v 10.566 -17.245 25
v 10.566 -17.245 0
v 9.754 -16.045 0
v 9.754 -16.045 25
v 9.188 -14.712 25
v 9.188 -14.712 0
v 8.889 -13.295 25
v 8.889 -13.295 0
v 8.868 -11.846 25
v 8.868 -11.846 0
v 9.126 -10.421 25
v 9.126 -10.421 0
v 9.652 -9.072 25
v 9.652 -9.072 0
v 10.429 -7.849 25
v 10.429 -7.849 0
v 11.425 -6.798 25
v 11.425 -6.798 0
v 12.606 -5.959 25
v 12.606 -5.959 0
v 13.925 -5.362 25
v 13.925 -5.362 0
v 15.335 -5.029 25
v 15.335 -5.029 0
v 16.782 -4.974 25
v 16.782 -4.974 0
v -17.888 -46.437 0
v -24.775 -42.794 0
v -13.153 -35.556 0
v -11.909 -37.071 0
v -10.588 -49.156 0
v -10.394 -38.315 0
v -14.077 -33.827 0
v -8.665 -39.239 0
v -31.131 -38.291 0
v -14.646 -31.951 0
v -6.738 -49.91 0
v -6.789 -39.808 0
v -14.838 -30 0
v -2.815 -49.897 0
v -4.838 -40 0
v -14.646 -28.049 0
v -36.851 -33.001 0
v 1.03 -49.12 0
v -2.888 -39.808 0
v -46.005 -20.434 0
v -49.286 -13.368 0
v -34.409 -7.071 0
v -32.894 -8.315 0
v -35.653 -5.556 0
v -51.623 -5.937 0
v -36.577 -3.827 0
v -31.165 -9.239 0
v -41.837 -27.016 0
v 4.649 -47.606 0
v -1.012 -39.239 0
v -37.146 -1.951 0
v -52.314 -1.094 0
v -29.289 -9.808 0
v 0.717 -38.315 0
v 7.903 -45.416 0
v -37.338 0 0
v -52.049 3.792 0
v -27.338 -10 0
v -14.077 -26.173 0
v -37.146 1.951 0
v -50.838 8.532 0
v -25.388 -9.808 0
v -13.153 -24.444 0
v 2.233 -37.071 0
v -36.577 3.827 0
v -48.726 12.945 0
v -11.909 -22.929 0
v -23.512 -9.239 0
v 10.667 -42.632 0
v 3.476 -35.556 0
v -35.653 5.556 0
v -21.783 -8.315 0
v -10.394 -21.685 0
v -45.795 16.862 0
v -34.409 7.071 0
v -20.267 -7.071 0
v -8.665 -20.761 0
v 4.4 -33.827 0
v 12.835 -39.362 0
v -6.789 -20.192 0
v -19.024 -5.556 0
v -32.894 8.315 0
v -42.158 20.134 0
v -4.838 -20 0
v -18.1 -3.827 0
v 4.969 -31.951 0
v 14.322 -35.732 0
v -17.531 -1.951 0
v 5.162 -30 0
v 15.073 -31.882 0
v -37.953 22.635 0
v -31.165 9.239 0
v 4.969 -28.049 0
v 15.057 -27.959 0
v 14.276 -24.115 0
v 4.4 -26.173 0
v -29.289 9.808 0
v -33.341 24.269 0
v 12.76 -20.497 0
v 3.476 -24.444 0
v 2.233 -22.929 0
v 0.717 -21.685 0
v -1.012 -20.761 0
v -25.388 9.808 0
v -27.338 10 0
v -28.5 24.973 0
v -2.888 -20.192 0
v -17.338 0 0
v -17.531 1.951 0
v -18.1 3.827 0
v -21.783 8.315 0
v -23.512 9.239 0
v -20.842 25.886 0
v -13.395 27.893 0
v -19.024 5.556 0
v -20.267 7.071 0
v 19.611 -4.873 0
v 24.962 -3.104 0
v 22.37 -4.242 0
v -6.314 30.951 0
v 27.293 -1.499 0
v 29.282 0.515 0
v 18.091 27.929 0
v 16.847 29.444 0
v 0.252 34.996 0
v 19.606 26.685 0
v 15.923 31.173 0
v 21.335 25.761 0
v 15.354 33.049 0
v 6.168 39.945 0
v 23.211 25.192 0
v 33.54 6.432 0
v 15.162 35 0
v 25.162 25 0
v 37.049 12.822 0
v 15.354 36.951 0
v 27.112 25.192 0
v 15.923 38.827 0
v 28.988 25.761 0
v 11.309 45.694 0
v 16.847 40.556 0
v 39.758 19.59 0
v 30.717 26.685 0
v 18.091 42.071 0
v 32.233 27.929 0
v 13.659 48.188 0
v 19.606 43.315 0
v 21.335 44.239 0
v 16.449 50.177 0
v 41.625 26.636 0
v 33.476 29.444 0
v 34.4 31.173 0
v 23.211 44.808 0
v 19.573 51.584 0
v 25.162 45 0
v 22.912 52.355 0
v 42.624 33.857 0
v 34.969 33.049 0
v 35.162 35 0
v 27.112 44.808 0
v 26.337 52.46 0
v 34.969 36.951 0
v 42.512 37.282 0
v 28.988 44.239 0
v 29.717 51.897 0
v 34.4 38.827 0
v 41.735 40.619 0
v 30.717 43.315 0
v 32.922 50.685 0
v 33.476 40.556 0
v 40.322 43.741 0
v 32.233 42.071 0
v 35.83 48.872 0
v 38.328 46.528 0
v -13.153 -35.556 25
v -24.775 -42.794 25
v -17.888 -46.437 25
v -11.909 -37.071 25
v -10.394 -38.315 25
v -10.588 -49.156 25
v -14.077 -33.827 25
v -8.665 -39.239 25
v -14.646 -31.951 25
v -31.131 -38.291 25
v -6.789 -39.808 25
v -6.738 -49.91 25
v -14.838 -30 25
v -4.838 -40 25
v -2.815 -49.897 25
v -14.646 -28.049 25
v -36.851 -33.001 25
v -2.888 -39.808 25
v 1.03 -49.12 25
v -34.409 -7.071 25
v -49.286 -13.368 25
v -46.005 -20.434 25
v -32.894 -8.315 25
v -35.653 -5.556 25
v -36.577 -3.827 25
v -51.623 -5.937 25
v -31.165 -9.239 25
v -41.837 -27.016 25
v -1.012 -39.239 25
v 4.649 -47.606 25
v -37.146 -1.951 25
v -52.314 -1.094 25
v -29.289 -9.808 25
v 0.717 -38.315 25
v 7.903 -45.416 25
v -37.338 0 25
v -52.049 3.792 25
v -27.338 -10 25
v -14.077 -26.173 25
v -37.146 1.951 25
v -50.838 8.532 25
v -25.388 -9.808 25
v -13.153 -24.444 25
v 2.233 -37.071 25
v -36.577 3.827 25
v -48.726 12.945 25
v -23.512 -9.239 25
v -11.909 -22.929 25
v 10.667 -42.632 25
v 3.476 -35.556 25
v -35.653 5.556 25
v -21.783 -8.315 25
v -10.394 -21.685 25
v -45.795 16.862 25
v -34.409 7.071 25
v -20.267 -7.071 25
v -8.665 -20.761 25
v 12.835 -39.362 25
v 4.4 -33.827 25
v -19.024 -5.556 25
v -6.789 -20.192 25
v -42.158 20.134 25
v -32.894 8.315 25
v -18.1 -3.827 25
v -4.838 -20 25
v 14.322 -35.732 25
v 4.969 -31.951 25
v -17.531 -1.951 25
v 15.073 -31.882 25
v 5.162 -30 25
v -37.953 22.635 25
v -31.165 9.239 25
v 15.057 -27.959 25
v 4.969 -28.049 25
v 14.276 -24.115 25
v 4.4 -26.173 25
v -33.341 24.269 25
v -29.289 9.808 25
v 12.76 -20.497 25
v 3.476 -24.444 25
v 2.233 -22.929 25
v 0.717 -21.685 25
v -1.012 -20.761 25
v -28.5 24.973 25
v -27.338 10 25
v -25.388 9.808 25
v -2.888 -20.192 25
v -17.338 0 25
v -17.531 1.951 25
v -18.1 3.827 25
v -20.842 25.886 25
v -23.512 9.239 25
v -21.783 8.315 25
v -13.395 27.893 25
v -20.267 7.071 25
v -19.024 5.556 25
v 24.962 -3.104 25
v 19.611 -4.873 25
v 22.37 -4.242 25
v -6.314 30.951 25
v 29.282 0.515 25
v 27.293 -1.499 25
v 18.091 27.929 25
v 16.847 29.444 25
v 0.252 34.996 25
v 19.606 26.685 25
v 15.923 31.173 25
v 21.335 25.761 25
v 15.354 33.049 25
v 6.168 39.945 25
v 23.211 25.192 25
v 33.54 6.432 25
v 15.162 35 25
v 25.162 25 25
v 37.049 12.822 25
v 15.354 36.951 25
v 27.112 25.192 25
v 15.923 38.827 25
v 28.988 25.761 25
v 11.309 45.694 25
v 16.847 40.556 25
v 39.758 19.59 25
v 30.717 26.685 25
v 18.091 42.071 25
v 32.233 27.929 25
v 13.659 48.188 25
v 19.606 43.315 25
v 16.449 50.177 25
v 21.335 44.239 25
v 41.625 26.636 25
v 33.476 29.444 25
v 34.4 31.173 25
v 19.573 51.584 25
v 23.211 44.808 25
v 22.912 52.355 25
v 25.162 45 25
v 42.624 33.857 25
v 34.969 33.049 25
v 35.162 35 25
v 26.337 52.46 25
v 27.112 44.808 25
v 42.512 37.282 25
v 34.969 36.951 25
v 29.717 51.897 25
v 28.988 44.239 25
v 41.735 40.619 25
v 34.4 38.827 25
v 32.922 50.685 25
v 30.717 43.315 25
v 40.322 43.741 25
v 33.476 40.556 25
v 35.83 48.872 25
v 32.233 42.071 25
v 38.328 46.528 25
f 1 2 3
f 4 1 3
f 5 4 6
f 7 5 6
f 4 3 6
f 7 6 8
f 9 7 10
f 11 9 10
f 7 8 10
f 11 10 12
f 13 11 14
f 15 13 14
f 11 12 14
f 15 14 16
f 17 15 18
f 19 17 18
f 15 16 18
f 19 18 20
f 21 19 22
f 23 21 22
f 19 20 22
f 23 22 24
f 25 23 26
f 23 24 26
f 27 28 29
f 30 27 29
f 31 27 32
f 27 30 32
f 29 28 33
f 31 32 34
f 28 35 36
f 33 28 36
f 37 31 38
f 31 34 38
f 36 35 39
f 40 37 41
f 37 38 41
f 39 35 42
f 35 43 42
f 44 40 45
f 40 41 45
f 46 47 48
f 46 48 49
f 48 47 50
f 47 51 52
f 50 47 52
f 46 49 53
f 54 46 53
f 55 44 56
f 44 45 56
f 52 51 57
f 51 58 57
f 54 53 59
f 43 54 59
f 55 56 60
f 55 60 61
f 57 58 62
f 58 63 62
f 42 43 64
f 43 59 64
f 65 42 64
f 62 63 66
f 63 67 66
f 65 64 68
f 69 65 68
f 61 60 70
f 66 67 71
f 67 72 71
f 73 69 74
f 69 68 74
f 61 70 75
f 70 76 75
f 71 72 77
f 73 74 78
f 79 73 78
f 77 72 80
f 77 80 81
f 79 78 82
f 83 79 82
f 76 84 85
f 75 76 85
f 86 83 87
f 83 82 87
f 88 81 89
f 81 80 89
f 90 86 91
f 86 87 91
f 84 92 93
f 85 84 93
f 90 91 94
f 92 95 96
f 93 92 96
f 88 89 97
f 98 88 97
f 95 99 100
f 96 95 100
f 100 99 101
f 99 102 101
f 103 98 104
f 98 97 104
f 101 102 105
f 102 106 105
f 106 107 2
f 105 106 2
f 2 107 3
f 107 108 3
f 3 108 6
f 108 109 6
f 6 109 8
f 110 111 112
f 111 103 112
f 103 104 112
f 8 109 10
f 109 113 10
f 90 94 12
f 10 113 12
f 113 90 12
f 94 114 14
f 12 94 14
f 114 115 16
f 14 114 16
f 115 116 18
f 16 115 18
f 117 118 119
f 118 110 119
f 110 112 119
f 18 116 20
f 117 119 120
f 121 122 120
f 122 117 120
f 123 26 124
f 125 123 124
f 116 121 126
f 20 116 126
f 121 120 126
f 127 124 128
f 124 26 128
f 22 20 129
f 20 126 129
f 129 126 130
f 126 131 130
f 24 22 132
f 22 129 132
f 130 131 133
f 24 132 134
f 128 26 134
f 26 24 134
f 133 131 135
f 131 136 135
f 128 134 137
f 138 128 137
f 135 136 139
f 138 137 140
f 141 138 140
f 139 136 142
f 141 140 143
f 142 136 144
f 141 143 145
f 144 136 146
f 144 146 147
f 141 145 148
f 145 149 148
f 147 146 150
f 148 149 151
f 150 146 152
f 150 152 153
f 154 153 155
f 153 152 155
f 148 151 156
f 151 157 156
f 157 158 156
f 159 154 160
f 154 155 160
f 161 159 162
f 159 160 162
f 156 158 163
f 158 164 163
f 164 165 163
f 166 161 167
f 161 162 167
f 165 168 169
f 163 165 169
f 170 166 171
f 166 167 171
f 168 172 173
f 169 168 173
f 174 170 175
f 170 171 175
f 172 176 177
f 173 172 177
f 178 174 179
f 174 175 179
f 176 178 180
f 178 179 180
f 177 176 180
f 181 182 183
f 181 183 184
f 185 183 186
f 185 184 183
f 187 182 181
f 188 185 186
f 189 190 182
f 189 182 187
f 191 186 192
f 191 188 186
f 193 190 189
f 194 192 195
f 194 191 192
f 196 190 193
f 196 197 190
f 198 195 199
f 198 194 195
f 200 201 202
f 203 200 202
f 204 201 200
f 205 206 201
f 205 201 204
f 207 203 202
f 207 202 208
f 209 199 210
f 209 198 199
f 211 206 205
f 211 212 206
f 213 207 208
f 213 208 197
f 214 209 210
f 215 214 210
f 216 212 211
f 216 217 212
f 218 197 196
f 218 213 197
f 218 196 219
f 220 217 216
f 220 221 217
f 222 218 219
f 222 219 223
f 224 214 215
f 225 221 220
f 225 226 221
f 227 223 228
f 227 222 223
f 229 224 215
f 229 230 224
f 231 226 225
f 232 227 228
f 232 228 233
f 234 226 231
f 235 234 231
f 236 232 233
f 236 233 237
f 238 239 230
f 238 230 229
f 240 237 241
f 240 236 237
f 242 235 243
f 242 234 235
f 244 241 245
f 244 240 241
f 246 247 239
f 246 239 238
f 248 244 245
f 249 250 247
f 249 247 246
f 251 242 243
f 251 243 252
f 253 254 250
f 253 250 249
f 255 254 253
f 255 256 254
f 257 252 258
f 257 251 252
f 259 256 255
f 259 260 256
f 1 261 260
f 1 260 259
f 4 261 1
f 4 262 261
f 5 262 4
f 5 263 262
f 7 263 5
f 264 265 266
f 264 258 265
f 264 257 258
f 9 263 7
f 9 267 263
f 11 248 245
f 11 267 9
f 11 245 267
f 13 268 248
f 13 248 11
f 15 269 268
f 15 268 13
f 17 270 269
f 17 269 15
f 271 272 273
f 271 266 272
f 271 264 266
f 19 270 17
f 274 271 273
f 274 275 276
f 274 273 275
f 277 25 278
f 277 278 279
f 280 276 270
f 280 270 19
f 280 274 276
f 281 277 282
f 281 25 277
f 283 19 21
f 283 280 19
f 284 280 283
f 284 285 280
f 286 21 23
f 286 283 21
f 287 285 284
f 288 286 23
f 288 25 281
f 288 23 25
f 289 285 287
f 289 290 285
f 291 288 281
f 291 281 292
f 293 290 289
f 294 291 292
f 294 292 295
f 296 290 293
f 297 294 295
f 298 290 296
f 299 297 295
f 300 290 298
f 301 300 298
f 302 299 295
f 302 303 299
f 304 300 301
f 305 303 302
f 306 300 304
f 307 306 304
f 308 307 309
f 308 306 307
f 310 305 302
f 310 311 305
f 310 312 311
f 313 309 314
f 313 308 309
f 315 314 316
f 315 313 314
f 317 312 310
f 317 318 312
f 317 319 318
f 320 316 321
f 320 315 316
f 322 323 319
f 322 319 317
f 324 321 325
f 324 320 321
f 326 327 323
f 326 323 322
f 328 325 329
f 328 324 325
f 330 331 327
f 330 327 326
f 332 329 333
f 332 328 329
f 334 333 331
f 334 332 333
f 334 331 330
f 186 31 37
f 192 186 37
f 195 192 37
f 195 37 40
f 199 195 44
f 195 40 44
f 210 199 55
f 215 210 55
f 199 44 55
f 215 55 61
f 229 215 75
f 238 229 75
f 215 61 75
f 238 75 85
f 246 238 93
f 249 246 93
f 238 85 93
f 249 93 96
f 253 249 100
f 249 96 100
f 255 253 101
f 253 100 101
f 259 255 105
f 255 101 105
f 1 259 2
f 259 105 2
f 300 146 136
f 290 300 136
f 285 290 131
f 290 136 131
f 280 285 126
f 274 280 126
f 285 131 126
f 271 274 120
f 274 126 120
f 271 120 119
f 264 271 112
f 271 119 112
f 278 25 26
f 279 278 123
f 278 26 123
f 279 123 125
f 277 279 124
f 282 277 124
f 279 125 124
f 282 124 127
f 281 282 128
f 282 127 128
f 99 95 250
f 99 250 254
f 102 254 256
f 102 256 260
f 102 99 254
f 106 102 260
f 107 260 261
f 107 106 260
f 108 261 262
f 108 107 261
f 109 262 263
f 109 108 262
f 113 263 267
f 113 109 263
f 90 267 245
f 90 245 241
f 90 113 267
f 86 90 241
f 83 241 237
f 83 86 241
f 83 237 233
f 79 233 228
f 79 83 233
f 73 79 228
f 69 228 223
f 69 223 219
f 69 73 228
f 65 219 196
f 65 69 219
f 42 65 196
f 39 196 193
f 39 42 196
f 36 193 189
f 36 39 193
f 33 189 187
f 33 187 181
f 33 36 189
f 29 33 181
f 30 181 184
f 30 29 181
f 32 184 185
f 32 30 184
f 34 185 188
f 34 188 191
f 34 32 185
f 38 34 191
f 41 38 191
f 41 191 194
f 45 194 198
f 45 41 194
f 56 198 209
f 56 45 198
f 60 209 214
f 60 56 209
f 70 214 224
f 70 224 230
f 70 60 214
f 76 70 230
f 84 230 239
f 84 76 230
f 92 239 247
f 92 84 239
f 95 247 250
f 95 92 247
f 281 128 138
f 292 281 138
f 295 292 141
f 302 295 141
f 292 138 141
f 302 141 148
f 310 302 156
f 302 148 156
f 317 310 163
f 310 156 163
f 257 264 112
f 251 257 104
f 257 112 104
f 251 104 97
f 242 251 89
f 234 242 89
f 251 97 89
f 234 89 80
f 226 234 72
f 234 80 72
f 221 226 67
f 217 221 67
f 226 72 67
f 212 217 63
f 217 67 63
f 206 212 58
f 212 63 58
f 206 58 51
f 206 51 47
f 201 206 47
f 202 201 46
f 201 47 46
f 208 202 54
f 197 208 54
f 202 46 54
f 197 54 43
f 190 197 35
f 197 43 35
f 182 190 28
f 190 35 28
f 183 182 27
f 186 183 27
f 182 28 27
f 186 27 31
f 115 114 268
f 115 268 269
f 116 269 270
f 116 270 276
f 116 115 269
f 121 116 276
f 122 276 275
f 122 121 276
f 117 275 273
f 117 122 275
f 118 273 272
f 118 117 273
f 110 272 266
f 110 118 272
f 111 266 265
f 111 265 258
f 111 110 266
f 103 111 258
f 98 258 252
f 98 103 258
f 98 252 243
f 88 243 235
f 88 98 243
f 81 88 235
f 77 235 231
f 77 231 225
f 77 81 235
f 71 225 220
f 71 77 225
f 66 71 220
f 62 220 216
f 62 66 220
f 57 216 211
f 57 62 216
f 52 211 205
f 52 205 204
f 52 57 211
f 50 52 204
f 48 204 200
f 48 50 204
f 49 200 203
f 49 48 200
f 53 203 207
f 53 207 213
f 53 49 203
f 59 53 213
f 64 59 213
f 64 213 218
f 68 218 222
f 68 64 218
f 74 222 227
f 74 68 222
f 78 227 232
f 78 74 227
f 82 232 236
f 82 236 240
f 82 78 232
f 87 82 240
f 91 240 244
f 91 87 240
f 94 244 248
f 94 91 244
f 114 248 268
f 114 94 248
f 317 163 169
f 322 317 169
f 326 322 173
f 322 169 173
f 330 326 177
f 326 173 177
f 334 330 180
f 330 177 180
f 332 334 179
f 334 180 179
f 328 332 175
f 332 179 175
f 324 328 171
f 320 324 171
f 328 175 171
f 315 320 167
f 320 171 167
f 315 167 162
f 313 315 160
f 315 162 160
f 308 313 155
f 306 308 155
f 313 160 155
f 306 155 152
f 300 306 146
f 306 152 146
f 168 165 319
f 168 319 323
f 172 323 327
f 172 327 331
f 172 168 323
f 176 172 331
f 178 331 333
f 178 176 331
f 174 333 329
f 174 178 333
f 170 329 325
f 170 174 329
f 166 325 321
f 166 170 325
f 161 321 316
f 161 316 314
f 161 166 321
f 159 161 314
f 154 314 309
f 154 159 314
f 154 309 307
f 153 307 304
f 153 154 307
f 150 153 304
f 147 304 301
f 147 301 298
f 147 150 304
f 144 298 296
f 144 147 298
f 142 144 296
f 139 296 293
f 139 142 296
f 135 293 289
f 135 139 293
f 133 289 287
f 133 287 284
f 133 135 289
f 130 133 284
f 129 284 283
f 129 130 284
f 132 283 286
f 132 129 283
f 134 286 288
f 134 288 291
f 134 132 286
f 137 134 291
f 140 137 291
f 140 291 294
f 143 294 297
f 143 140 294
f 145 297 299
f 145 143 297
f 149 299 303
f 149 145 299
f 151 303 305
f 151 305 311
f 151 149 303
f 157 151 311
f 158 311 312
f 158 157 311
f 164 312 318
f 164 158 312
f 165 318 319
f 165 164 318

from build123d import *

# Parameters (mm, degrees)
F0_R     = 10
F1_DEPTH = 25


with BuildPart() as f1:
    # F0 (on Top) → F1 (new body)
    with BuildSketch(Plane.XY):
        with BuildLine():
            ThreePointArc((-10.5878, -49.155795), (11.831524, -41.050494), (10.566127, -17.244596))
            ThreePointArc((10.566127, -17.244596), (9.652404, -9.071889), (16.782416, -4.974213))
            ThreePointArc((16.782416, -4.974213), (23.692785, -3.734072), (29.28189, 0.514817))
            ThreePointArc((29.28189, 0.514817), (38.506241, 16.164452), (42.624255, 33.857436))
            ThreePointArc((42.624255, 33.857436), (31.349021, 51.369659), (11.30918, 45.693954))
            ThreePointArc((11.30918, 45.693954), (-6.314116, 30.95087), (-28.499794, 24.973009))
            ThreePointArc((-28.499794, 24.973009), (-47.356712, 14.975562), (-51.623254, -5.93685))
            ThreePointArc((-51.623254, -5.93685), (-36.850918, -33.001447), (-10.5878, -49.155795))
        make_face()
        with Locations((-27.338407, 0)):
            Circle(F0_R, mode=Mode.SUBTRACT)
        with Locations((-4.838407, -30)):
            Circle(F0_R, mode=Mode.SUBTRACT)
        with Locations((25.161593, 35)):
            Circle(F0_R, mode=Mode.SUBTRACT)
    extrude(amount=F1_DEPTH)


solid = f1.part
